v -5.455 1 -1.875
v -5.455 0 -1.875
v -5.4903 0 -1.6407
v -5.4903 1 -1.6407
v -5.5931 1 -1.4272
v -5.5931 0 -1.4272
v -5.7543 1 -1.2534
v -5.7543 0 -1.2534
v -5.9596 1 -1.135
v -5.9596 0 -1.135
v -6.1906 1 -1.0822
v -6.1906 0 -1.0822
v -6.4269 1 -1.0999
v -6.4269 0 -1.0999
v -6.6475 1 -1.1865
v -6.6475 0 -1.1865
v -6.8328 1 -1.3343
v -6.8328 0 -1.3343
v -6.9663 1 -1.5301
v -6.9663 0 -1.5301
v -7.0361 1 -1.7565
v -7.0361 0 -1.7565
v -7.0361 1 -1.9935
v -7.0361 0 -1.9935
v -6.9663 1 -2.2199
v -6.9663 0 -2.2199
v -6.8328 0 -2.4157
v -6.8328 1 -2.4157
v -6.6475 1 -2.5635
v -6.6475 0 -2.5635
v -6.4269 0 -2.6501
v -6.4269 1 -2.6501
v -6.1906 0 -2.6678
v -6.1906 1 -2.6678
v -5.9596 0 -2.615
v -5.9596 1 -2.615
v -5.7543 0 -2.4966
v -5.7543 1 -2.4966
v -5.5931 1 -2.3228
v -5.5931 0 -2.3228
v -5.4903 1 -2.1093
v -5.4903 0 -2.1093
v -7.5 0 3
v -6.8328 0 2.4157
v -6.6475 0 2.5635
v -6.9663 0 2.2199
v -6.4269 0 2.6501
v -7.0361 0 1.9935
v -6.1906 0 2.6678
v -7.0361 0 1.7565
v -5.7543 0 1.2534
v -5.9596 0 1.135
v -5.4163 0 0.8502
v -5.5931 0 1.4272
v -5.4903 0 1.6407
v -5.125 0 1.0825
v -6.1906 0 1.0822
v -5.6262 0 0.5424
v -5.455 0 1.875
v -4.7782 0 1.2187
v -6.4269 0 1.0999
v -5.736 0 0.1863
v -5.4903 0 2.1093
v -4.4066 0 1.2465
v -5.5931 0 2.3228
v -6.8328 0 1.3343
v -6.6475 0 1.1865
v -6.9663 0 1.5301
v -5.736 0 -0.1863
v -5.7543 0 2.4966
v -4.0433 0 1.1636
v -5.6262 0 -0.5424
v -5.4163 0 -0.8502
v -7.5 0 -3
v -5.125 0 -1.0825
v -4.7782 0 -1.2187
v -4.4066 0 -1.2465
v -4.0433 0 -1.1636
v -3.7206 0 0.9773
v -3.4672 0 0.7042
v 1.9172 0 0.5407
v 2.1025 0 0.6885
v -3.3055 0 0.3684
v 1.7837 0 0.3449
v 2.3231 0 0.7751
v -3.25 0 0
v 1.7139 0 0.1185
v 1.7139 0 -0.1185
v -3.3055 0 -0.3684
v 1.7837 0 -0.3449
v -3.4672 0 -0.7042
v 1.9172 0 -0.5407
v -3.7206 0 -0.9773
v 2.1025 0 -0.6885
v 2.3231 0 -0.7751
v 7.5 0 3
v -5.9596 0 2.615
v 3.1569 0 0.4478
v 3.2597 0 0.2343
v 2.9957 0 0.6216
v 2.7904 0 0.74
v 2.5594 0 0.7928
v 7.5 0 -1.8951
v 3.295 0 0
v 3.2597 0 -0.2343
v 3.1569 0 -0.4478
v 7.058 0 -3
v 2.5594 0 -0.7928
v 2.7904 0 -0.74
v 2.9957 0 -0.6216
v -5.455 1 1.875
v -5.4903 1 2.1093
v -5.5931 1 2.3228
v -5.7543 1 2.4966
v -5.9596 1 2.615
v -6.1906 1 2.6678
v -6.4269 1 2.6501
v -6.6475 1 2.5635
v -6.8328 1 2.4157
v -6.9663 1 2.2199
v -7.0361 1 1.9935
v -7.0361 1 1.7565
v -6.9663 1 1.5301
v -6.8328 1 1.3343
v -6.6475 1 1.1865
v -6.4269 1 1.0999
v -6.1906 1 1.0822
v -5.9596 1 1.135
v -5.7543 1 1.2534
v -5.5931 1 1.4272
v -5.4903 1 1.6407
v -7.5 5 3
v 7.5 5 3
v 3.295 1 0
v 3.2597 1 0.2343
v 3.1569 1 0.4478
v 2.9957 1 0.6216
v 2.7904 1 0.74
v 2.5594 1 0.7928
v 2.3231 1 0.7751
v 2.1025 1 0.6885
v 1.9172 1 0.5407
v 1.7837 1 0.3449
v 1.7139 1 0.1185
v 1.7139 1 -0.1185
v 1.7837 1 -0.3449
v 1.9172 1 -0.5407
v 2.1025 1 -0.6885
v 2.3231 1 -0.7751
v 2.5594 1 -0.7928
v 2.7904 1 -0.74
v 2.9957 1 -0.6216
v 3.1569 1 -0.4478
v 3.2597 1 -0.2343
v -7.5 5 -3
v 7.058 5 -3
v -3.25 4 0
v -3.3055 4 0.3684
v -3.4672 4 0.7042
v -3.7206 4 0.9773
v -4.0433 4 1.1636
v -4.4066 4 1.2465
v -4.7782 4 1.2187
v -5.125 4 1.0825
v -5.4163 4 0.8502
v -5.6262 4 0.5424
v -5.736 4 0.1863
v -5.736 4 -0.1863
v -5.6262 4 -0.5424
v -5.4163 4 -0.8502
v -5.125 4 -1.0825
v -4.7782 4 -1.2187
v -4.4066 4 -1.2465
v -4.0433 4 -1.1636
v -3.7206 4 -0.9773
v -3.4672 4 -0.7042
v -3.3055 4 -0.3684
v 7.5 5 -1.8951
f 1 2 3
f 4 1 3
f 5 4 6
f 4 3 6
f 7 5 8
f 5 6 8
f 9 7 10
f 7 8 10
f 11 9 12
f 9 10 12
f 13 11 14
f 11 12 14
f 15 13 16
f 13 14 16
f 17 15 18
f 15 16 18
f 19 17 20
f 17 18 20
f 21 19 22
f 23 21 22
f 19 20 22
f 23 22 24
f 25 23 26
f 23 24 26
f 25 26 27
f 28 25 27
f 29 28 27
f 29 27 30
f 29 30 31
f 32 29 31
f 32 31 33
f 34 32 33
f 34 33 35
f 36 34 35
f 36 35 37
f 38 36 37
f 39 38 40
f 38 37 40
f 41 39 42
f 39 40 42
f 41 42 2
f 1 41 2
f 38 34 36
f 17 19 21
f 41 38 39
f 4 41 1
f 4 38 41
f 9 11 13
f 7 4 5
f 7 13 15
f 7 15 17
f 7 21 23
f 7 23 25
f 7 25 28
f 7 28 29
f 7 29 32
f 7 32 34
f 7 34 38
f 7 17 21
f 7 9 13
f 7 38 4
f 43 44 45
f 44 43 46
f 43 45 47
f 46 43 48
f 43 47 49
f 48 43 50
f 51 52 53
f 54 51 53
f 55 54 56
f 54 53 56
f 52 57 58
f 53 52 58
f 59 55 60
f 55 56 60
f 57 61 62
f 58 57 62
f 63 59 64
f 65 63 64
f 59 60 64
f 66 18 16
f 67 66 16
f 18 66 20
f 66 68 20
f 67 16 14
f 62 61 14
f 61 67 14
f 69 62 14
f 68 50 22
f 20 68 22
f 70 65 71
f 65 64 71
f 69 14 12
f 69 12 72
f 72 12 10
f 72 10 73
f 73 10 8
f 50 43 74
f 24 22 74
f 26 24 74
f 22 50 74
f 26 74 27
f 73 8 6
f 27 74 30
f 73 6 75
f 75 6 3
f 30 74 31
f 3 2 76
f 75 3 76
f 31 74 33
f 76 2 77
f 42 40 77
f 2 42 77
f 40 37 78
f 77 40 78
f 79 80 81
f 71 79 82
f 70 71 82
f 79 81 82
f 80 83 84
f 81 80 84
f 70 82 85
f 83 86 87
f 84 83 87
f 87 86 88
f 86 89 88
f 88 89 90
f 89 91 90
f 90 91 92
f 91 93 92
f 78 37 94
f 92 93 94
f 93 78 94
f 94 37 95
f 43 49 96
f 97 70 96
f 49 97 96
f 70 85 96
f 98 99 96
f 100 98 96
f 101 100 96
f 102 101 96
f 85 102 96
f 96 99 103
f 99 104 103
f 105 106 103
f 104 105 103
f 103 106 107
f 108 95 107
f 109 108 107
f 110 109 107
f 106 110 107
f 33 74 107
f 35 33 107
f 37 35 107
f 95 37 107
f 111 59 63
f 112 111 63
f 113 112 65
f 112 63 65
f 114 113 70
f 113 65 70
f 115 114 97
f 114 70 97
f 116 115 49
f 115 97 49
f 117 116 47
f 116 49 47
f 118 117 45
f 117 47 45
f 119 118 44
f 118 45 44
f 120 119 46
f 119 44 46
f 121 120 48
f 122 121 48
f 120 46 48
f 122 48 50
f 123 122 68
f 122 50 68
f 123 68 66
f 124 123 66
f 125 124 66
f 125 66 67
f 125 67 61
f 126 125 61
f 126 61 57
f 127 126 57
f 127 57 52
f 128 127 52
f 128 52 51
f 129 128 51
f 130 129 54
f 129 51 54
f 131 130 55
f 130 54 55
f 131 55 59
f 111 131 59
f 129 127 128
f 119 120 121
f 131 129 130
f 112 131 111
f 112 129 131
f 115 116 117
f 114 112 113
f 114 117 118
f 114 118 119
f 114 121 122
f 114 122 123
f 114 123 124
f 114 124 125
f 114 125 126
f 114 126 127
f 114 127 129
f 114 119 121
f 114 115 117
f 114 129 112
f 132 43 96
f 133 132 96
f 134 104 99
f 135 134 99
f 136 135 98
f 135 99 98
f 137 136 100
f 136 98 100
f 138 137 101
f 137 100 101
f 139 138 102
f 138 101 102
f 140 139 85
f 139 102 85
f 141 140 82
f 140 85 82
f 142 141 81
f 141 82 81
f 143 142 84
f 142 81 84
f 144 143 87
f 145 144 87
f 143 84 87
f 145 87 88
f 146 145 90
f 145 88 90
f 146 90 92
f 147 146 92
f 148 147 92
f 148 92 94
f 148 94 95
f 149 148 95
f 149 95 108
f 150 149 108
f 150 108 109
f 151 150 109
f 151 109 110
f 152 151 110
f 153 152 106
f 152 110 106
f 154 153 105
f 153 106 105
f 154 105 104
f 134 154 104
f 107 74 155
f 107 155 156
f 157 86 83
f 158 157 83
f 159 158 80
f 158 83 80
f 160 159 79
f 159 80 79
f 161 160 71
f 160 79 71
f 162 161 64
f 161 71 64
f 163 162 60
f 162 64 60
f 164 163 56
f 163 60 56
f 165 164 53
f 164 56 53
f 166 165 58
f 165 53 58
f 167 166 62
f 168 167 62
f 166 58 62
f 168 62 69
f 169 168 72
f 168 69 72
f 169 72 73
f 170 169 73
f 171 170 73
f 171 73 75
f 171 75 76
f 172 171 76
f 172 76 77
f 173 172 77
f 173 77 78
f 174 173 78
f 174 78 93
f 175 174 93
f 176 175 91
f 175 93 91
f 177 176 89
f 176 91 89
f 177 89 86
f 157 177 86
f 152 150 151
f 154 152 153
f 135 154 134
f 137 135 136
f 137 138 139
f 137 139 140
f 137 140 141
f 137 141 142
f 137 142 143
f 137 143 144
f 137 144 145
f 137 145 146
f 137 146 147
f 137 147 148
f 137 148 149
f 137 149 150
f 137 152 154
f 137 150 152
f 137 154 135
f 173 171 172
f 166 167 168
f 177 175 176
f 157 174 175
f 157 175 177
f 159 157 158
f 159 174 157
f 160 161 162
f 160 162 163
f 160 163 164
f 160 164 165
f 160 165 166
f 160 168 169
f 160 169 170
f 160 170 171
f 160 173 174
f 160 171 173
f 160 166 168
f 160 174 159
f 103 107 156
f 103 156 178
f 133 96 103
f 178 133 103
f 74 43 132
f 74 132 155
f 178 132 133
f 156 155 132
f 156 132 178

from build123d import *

# Parameters (mm, degrees)
SKETCH1_W              = 15
SKETCH1_H              = 6
MAIN_BODY_DEPTH        = 5
SKETCH3_R              = 1.25
GRIN_HOLE_DEPTH        = 4
SKETCH2_R              = 0.795
MAGNET_HOLES_DEPTH     = 1
SET_SCREW_INDENT_DEPTH = 6


with BuildPart() as part:
    # Sketch1 → Main Body (new body)
    with BuildSketch(Plane(origin=(0, 0, 0), x_dir=(1, 0, 0), z_dir=(0, 1, 0))):
        Rectangle(SKETCH1_W, SKETCH1_H)
    extrude(amount=MAIN_BODY_DEPTH)

    # Sketch3 → GRIN Hole (cut)
    with BuildSketch(Plane.XZ):
        with Locations((-4.5, 0)):
            Circle(SKETCH3_R)
    extrude(amount=-GRIN_HOLE_DEPTH, mode=Mode.SUBTRACT)

    # Sketch2 → Magnet Holes (cut)
    with BuildSketch(Plane.XZ):
        with Locations((-6.25, -1.875)):
            Circle(SKETCH2_R)
        with Locations((-6.25, 1.875)):
            Circle(SKETCH2_R)
        with Locations((2.5, 0)):
            Circle(SKETCH2_R)
    extrude(amount=-MAGNET_HOLES_DEPTH, mode=Mode.SUBTRACT)

    # Sketch4 → Set Screw Indent (cut, through all)
    with BuildSketch(Plane.XZ):
        Polygon((7.058045095, -3), (7.5, -1.895112738), (7.5, -3), align=None)
    extrude(amount=-SET_SCREW_INDENT_DEPTH, mode=Mode.SUBTRACT)


solid = part.part
